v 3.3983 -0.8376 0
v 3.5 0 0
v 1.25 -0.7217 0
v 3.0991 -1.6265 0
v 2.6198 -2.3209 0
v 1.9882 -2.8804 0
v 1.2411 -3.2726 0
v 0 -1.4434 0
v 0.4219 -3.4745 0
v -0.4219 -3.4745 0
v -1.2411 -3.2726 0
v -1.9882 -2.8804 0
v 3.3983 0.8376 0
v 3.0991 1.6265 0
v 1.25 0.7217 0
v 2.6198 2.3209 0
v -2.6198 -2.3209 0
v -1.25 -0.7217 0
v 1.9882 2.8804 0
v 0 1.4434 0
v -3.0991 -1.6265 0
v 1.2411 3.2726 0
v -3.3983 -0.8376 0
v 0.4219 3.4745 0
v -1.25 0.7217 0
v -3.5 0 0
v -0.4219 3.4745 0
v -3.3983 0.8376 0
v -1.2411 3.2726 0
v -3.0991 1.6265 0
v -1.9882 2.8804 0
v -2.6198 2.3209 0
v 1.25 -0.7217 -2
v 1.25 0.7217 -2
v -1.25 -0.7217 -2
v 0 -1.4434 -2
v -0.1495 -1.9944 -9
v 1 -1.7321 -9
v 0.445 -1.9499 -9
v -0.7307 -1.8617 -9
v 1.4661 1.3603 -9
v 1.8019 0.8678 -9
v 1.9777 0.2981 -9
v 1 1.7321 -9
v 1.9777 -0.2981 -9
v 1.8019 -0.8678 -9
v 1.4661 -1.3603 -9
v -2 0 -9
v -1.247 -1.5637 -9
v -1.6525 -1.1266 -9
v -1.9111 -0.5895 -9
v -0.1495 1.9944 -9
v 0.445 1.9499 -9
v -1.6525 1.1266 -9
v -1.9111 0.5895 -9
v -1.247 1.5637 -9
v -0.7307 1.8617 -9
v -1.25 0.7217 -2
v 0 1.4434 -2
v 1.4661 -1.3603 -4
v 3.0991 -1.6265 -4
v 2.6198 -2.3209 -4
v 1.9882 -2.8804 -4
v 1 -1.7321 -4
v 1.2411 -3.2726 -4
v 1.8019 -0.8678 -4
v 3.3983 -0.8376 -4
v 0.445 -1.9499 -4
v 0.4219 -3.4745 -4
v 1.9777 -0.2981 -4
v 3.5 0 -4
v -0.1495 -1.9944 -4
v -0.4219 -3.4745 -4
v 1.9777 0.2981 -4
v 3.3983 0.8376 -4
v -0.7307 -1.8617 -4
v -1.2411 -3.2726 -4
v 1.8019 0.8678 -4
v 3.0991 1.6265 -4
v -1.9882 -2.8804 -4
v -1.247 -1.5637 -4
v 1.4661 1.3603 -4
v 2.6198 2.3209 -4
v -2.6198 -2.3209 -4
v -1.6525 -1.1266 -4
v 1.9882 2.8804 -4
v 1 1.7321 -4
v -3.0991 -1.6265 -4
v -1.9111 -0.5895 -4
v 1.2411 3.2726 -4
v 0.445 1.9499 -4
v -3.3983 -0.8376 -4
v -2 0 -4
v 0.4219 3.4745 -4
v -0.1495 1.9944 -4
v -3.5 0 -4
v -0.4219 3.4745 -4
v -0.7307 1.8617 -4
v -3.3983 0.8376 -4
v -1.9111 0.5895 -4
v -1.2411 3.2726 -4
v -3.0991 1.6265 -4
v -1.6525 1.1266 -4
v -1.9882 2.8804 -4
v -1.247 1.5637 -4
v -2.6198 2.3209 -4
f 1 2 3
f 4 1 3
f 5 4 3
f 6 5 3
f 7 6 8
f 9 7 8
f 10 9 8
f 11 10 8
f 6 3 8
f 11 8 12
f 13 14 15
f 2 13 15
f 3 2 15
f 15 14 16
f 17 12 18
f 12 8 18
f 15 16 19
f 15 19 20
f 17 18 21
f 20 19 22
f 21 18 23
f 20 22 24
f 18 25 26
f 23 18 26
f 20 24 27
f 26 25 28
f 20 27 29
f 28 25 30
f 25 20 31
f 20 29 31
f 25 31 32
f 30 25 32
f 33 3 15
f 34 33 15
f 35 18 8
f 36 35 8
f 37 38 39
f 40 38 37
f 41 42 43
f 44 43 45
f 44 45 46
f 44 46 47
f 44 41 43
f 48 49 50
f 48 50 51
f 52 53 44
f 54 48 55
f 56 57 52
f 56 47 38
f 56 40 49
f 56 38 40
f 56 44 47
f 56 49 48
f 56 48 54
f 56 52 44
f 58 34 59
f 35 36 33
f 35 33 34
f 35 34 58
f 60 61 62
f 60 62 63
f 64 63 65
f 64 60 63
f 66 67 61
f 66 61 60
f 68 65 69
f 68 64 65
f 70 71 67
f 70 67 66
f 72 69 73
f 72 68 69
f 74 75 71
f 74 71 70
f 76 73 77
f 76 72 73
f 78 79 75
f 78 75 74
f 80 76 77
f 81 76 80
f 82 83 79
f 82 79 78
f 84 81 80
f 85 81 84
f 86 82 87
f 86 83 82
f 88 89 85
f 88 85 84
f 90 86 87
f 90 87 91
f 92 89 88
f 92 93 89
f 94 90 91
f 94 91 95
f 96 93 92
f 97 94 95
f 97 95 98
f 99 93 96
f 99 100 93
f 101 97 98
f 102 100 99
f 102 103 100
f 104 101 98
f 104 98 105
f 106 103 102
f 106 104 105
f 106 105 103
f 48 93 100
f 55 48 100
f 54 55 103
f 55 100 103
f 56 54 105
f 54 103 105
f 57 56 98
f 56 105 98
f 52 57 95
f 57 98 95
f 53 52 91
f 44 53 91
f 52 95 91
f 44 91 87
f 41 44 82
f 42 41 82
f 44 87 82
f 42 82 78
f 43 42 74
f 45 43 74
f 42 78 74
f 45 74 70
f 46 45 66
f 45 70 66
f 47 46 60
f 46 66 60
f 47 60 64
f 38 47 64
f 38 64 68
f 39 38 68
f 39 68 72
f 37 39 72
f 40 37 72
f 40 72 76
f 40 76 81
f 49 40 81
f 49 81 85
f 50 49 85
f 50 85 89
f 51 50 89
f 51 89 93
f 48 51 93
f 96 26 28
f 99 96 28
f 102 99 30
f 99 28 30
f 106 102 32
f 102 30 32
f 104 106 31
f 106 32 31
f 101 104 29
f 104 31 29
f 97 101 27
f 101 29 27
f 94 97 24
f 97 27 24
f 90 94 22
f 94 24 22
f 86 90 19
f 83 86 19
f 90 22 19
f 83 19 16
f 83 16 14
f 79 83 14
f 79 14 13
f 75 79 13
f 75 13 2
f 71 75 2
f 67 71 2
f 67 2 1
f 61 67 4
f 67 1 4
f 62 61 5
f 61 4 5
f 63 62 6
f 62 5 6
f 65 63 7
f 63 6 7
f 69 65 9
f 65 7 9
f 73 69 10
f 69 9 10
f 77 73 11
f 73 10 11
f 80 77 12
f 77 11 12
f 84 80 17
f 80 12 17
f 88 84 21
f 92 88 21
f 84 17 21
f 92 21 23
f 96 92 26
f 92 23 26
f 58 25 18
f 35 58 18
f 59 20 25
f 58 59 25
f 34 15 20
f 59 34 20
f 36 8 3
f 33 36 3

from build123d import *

# Parameters (mm, degrees)
CYLINDER028_R                      = 2
CYLINDER028_DEPTH                  = 9
CYLINDER027_R                      = 3.5
CYLINDER027_DEPTH                  = 4
FUSION001018017024_PLACEMENT_ANGLE = 180
POCKET002018004005005017010_DEPTH  = 2


with BuildPart() as cylinder028:
    # Cylinder028 → Cylinder028 (new body)
    with BuildSketch(Plane.XY):
        Circle(CYLINDER028_R)
    extrude(amount=CYLINDER028_DEPTH)


with BuildPart() as zylinderkopfschraube_m4x6_din912:
    # Cylinder027 → Cylinder027 (new body)
    with BuildSketch(Plane.XY):
        Circle(CYLINDER027_R)
    extrude(amount=CYLINDER027_DEPTH)

    # Fusion001018017024: union Cylinder028
    add(cylinder028.part)


with BuildPart() as zylinderkopfschraube_m4x6_din912_1:
    # Fusion001018017024 placement: moved
    add(zylinderkopfschraube_m4x6_din912.part.rotate(Axis((0, 0, 0), (0, 1, 0)), FUSION001018017024_PLACEMENT_ANGLE))

    # Sketch028 → Pocket002018004005005017010 (cut)
    with BuildSketch(Plane(origin=(0, 0, 0), x_dir=(-1, 0, 0), z_dir=(0, 0, 1))):
        Polygon((1.25, -0.721688), (1.25, 0.721688), (0, 1.443376), (-1.25, 0.721688), (-1.25, -0.721688), (0, -1.443376), align=None)
    extrude(amount=-POCKET002018004005005017010_DEPTH, mode=Mode.SUBTRACT)


solid = zylinderkopfschraube_m4x6_din912_1.part
